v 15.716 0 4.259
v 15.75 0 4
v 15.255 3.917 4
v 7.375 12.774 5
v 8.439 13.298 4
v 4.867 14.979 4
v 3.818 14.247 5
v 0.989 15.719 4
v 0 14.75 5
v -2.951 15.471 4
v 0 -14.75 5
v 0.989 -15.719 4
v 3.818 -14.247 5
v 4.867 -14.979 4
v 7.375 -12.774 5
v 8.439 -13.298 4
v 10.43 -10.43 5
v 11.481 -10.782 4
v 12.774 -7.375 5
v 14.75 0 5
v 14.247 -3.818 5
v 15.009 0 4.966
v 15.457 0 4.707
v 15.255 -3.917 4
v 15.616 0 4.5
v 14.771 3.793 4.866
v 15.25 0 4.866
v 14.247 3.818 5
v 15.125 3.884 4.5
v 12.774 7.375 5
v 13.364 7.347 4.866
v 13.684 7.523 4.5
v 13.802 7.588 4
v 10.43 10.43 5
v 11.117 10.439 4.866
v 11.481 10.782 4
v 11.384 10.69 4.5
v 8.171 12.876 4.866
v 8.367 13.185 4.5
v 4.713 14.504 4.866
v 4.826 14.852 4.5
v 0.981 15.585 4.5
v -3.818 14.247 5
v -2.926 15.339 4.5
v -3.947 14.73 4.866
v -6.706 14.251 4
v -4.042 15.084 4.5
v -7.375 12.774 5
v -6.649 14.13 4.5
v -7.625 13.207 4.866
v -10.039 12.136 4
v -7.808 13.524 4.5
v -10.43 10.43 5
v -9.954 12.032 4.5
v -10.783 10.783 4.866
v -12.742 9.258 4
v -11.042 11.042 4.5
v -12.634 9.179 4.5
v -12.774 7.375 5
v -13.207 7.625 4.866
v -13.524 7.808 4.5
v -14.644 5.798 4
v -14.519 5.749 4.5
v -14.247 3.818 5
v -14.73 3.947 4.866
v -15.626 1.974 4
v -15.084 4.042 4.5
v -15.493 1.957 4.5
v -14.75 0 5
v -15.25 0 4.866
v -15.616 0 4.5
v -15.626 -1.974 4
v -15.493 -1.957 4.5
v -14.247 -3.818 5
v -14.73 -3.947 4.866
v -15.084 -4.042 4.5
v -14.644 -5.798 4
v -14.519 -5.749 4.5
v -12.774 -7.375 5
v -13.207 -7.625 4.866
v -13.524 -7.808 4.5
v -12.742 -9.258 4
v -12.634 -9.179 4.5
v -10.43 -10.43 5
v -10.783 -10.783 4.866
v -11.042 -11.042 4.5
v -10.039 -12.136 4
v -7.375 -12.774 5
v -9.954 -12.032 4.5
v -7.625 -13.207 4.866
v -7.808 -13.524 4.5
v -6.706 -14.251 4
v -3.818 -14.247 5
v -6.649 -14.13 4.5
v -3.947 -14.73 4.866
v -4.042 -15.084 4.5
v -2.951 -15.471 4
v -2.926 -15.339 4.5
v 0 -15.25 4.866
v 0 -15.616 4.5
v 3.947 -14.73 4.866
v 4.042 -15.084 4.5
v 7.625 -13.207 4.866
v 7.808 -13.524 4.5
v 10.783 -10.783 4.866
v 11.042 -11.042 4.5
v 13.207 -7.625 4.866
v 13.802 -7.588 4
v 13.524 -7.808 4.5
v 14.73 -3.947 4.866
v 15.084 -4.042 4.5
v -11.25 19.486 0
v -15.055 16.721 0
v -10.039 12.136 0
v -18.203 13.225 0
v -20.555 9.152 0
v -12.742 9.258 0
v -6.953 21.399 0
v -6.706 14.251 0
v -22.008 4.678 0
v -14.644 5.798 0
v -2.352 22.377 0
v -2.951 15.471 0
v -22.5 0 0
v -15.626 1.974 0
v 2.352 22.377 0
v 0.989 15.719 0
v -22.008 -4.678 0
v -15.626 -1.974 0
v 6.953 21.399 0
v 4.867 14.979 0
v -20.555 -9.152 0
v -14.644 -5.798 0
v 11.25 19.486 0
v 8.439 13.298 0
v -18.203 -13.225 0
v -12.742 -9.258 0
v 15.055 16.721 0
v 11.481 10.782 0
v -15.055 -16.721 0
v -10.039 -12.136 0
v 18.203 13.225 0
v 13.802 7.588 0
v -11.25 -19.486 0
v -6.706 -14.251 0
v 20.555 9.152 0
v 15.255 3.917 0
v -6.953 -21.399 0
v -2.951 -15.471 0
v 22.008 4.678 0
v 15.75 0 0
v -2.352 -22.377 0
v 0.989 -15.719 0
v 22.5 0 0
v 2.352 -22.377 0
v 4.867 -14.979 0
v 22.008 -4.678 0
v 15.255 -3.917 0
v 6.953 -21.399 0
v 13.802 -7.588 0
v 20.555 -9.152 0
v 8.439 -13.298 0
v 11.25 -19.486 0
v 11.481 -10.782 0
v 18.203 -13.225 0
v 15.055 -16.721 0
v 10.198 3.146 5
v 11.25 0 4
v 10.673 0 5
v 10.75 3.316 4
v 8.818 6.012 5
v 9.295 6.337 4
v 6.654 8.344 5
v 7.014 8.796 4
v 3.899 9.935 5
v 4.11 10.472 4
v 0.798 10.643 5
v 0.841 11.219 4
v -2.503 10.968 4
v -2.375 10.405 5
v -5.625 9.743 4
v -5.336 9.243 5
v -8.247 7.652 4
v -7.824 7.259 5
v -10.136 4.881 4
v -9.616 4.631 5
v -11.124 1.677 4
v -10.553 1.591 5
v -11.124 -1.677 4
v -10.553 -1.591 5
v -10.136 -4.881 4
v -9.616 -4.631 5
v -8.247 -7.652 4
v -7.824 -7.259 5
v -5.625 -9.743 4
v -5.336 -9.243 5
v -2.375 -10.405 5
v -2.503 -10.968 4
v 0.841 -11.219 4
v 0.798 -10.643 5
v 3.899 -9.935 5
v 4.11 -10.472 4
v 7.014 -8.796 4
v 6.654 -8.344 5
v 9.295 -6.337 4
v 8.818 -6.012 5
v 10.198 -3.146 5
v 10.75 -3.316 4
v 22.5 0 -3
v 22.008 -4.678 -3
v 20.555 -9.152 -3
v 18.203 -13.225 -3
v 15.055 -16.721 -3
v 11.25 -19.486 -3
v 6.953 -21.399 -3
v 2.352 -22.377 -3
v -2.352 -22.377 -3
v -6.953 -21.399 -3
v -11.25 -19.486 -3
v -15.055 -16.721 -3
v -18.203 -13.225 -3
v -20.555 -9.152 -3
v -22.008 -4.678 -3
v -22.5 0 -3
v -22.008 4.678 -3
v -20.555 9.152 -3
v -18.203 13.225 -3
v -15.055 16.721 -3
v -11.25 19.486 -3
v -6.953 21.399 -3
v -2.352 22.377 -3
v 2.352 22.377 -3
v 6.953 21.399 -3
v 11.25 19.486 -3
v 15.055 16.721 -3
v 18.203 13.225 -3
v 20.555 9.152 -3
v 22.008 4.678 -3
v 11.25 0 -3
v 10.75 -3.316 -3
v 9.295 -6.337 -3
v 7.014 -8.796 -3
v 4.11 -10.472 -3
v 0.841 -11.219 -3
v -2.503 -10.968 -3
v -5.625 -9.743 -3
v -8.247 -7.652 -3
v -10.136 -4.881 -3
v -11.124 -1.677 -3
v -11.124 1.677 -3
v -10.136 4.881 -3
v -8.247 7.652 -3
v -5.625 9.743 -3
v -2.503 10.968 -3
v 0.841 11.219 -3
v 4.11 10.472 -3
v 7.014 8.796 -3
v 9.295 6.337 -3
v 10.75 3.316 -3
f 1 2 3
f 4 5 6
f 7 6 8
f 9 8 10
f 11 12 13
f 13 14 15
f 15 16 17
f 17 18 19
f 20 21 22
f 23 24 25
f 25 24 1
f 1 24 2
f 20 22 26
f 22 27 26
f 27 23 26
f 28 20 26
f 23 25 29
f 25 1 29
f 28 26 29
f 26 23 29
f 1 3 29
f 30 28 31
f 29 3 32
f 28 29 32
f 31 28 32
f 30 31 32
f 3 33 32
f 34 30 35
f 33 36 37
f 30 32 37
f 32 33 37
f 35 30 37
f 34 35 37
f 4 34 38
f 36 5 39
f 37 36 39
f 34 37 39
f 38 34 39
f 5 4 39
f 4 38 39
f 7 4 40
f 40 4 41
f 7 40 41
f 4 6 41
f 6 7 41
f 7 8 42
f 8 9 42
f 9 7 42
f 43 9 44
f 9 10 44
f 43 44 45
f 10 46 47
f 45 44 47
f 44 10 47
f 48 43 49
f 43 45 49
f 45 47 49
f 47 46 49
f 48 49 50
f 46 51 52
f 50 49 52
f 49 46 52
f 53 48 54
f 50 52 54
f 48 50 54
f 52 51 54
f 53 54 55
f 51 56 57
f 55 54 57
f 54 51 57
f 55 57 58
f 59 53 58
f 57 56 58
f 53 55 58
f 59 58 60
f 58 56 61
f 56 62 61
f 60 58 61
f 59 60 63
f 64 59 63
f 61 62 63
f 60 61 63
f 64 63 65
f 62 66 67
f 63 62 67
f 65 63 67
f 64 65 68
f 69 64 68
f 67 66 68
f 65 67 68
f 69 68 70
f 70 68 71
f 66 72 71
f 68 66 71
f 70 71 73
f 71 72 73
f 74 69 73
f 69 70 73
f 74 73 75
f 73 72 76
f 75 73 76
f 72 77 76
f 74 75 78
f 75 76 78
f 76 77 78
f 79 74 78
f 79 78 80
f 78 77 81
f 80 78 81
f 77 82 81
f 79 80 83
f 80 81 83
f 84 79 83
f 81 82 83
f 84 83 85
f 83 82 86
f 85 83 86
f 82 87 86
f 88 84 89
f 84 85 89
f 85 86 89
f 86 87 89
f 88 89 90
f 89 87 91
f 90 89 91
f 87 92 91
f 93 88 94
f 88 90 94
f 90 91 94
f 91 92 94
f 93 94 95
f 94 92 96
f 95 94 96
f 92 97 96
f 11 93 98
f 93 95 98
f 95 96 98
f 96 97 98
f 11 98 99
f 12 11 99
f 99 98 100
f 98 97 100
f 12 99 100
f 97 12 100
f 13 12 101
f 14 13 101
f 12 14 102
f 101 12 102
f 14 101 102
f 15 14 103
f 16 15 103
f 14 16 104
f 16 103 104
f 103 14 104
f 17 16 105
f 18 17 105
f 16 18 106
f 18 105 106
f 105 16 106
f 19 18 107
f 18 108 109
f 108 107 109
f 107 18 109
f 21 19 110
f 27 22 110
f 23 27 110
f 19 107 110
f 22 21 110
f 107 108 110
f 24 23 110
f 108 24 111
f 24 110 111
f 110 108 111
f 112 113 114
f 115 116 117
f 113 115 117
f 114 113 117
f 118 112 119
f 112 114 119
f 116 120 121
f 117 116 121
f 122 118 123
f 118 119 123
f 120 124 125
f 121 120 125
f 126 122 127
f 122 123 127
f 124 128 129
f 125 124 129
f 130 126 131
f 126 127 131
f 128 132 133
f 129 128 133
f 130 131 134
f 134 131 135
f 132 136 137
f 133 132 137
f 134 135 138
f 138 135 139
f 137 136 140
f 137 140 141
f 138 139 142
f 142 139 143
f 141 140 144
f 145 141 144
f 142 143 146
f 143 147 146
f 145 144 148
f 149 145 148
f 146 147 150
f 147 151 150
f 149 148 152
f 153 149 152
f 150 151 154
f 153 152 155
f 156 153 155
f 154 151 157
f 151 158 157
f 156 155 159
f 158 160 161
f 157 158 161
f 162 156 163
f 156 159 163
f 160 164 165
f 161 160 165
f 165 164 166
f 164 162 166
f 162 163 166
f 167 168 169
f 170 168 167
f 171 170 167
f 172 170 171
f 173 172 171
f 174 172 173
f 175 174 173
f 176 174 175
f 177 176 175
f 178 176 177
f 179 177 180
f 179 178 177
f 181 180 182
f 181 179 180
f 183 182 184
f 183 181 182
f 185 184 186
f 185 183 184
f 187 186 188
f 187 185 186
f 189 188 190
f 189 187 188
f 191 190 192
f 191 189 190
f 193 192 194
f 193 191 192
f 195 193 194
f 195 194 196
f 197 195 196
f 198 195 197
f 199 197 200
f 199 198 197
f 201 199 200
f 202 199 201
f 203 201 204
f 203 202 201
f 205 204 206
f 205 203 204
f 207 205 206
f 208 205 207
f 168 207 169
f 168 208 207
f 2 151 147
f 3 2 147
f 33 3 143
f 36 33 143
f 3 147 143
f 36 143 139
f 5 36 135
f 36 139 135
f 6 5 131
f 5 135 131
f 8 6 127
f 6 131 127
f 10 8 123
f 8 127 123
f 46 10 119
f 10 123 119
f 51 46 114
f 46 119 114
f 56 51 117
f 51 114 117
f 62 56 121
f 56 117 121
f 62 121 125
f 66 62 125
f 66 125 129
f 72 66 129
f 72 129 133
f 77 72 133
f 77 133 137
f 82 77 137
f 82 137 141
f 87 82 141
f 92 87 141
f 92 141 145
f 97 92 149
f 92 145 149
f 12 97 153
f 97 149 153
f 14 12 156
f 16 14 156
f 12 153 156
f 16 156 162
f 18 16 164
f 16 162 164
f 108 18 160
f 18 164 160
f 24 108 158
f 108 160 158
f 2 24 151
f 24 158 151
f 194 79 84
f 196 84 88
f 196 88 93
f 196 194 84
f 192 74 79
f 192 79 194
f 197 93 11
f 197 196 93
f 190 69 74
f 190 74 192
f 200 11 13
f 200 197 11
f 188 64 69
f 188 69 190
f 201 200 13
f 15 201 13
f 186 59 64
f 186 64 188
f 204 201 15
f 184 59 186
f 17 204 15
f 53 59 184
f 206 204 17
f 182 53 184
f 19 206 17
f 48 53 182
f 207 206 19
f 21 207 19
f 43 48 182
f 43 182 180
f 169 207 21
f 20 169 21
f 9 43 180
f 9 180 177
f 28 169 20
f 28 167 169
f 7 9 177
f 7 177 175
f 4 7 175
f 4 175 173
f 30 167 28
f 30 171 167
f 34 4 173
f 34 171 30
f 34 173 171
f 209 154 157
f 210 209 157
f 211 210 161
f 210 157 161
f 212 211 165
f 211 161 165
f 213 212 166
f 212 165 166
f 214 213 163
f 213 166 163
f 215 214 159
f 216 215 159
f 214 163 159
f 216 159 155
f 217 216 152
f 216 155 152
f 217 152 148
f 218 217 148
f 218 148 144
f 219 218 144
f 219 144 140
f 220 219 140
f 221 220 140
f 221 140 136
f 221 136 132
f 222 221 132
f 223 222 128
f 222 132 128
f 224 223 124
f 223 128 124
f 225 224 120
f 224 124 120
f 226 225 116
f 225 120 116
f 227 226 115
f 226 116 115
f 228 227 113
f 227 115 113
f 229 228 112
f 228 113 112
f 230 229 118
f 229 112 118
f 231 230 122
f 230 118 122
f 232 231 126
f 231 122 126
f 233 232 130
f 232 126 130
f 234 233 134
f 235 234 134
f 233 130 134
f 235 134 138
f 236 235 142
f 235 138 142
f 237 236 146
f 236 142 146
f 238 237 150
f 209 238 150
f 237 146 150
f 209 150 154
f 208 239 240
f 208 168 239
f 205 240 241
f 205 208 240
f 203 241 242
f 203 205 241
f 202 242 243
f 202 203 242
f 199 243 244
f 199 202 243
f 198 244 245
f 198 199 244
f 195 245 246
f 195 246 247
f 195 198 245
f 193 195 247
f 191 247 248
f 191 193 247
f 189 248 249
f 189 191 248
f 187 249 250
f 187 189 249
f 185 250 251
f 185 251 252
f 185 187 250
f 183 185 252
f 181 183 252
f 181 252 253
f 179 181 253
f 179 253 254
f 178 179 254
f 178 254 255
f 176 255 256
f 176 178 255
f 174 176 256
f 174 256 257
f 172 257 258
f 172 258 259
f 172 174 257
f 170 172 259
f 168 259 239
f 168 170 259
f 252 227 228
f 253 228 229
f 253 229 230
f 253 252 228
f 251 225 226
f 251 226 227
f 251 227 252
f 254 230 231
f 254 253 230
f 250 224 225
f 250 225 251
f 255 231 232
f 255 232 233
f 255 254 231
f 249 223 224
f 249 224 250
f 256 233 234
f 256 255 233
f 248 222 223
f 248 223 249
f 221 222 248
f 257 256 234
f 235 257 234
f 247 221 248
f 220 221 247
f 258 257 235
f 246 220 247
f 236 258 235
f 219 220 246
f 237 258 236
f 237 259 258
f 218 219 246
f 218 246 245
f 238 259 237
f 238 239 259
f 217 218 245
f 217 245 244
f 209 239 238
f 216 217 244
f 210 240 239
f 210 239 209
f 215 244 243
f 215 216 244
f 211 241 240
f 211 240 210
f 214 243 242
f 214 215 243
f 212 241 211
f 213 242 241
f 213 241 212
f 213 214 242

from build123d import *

# Parameters (mm, degrees)
F0_R        = 15.75
F0_R_2      = 11.25
F1_DEPTH    = 5
F2_R        = 22.5
F2_R_2      = 11.25
F3_DEPTH    = 3
F4_R        = 11.25
F4_R_2      = 10.25
F5_DEPTH    = 1
F6_S5_R     = 11.25
F6_T6_DEPTH = 17
F7_R        = 1


# Not quite as in the source:
# - a fillet or chamfer that OpenCascade refuses, or shapes differently, is made with other operations: its cross-section is extruded or revolved along the edge and cut away or added


with BuildPart() as f1:
    # F0 (on Top) → F1 (new body)
    with BuildSketch(Plane.XY):
        Circle(F0_R)
        Circle(F0_R_2, mode=Mode.SUBTRACT)
    extrude(amount=F1_DEPTH)

    # F2 (on face) → F3 (join)
    with BuildSketch(Plane(origin=(0, 0, 0), x_dir=(1, 0, 0), z_dir=(0, 0, -1))):
        Circle(F2_R)
        Circle(F2_R_2, mode=Mode.SUBTRACT)
    extrude(amount=F3_DEPTH)

    # F4 (on face) → F5 (join)
    with BuildSketch(Plane.XY.offset(5)):
        Circle(F4_R)
        Circle(F4_R_2, mode=Mode.SUBTRACT)
    extrude(amount=-F5_DEPTH)

    # F6: chamfer of 1 x 1.7320508076 on 1 edges, made by hand


with BuildPart() as f6_tool2:
    # F6_s3 → F6_t4 (revolve)
    with BuildSketch(Plane.XZ):
        Polygon((10.25, 5.7320508076), (11.25, 4), (10.25, 4), align=None)
    revolve(axis=Axis((0, 0, 4), (0, 0, 1)))

    # F6_s5 → F6_t6 (intersect, symmetric)
    with BuildSketch(Plane.XY.offset(4.9)):
        Circle(F6_S5_R)
    extrude(amount=F6_T6_DEPTH, both=True, mode=Mode.INTERSECT)


with BuildPart() as f1_1:
    add(f1.part)

    # F6_t1: cut F6_tool2
    add(f6_tool2.part, mode=Mode.SUBTRACT)

    # F7
    f7_edges = [f1_1.edges().sort_by_distance(p)[0] for p in [
        (-15.75, 0, 5),
    ]]
    fillet(f7_edges, radius=F7_R)


solid = f1_1.part
